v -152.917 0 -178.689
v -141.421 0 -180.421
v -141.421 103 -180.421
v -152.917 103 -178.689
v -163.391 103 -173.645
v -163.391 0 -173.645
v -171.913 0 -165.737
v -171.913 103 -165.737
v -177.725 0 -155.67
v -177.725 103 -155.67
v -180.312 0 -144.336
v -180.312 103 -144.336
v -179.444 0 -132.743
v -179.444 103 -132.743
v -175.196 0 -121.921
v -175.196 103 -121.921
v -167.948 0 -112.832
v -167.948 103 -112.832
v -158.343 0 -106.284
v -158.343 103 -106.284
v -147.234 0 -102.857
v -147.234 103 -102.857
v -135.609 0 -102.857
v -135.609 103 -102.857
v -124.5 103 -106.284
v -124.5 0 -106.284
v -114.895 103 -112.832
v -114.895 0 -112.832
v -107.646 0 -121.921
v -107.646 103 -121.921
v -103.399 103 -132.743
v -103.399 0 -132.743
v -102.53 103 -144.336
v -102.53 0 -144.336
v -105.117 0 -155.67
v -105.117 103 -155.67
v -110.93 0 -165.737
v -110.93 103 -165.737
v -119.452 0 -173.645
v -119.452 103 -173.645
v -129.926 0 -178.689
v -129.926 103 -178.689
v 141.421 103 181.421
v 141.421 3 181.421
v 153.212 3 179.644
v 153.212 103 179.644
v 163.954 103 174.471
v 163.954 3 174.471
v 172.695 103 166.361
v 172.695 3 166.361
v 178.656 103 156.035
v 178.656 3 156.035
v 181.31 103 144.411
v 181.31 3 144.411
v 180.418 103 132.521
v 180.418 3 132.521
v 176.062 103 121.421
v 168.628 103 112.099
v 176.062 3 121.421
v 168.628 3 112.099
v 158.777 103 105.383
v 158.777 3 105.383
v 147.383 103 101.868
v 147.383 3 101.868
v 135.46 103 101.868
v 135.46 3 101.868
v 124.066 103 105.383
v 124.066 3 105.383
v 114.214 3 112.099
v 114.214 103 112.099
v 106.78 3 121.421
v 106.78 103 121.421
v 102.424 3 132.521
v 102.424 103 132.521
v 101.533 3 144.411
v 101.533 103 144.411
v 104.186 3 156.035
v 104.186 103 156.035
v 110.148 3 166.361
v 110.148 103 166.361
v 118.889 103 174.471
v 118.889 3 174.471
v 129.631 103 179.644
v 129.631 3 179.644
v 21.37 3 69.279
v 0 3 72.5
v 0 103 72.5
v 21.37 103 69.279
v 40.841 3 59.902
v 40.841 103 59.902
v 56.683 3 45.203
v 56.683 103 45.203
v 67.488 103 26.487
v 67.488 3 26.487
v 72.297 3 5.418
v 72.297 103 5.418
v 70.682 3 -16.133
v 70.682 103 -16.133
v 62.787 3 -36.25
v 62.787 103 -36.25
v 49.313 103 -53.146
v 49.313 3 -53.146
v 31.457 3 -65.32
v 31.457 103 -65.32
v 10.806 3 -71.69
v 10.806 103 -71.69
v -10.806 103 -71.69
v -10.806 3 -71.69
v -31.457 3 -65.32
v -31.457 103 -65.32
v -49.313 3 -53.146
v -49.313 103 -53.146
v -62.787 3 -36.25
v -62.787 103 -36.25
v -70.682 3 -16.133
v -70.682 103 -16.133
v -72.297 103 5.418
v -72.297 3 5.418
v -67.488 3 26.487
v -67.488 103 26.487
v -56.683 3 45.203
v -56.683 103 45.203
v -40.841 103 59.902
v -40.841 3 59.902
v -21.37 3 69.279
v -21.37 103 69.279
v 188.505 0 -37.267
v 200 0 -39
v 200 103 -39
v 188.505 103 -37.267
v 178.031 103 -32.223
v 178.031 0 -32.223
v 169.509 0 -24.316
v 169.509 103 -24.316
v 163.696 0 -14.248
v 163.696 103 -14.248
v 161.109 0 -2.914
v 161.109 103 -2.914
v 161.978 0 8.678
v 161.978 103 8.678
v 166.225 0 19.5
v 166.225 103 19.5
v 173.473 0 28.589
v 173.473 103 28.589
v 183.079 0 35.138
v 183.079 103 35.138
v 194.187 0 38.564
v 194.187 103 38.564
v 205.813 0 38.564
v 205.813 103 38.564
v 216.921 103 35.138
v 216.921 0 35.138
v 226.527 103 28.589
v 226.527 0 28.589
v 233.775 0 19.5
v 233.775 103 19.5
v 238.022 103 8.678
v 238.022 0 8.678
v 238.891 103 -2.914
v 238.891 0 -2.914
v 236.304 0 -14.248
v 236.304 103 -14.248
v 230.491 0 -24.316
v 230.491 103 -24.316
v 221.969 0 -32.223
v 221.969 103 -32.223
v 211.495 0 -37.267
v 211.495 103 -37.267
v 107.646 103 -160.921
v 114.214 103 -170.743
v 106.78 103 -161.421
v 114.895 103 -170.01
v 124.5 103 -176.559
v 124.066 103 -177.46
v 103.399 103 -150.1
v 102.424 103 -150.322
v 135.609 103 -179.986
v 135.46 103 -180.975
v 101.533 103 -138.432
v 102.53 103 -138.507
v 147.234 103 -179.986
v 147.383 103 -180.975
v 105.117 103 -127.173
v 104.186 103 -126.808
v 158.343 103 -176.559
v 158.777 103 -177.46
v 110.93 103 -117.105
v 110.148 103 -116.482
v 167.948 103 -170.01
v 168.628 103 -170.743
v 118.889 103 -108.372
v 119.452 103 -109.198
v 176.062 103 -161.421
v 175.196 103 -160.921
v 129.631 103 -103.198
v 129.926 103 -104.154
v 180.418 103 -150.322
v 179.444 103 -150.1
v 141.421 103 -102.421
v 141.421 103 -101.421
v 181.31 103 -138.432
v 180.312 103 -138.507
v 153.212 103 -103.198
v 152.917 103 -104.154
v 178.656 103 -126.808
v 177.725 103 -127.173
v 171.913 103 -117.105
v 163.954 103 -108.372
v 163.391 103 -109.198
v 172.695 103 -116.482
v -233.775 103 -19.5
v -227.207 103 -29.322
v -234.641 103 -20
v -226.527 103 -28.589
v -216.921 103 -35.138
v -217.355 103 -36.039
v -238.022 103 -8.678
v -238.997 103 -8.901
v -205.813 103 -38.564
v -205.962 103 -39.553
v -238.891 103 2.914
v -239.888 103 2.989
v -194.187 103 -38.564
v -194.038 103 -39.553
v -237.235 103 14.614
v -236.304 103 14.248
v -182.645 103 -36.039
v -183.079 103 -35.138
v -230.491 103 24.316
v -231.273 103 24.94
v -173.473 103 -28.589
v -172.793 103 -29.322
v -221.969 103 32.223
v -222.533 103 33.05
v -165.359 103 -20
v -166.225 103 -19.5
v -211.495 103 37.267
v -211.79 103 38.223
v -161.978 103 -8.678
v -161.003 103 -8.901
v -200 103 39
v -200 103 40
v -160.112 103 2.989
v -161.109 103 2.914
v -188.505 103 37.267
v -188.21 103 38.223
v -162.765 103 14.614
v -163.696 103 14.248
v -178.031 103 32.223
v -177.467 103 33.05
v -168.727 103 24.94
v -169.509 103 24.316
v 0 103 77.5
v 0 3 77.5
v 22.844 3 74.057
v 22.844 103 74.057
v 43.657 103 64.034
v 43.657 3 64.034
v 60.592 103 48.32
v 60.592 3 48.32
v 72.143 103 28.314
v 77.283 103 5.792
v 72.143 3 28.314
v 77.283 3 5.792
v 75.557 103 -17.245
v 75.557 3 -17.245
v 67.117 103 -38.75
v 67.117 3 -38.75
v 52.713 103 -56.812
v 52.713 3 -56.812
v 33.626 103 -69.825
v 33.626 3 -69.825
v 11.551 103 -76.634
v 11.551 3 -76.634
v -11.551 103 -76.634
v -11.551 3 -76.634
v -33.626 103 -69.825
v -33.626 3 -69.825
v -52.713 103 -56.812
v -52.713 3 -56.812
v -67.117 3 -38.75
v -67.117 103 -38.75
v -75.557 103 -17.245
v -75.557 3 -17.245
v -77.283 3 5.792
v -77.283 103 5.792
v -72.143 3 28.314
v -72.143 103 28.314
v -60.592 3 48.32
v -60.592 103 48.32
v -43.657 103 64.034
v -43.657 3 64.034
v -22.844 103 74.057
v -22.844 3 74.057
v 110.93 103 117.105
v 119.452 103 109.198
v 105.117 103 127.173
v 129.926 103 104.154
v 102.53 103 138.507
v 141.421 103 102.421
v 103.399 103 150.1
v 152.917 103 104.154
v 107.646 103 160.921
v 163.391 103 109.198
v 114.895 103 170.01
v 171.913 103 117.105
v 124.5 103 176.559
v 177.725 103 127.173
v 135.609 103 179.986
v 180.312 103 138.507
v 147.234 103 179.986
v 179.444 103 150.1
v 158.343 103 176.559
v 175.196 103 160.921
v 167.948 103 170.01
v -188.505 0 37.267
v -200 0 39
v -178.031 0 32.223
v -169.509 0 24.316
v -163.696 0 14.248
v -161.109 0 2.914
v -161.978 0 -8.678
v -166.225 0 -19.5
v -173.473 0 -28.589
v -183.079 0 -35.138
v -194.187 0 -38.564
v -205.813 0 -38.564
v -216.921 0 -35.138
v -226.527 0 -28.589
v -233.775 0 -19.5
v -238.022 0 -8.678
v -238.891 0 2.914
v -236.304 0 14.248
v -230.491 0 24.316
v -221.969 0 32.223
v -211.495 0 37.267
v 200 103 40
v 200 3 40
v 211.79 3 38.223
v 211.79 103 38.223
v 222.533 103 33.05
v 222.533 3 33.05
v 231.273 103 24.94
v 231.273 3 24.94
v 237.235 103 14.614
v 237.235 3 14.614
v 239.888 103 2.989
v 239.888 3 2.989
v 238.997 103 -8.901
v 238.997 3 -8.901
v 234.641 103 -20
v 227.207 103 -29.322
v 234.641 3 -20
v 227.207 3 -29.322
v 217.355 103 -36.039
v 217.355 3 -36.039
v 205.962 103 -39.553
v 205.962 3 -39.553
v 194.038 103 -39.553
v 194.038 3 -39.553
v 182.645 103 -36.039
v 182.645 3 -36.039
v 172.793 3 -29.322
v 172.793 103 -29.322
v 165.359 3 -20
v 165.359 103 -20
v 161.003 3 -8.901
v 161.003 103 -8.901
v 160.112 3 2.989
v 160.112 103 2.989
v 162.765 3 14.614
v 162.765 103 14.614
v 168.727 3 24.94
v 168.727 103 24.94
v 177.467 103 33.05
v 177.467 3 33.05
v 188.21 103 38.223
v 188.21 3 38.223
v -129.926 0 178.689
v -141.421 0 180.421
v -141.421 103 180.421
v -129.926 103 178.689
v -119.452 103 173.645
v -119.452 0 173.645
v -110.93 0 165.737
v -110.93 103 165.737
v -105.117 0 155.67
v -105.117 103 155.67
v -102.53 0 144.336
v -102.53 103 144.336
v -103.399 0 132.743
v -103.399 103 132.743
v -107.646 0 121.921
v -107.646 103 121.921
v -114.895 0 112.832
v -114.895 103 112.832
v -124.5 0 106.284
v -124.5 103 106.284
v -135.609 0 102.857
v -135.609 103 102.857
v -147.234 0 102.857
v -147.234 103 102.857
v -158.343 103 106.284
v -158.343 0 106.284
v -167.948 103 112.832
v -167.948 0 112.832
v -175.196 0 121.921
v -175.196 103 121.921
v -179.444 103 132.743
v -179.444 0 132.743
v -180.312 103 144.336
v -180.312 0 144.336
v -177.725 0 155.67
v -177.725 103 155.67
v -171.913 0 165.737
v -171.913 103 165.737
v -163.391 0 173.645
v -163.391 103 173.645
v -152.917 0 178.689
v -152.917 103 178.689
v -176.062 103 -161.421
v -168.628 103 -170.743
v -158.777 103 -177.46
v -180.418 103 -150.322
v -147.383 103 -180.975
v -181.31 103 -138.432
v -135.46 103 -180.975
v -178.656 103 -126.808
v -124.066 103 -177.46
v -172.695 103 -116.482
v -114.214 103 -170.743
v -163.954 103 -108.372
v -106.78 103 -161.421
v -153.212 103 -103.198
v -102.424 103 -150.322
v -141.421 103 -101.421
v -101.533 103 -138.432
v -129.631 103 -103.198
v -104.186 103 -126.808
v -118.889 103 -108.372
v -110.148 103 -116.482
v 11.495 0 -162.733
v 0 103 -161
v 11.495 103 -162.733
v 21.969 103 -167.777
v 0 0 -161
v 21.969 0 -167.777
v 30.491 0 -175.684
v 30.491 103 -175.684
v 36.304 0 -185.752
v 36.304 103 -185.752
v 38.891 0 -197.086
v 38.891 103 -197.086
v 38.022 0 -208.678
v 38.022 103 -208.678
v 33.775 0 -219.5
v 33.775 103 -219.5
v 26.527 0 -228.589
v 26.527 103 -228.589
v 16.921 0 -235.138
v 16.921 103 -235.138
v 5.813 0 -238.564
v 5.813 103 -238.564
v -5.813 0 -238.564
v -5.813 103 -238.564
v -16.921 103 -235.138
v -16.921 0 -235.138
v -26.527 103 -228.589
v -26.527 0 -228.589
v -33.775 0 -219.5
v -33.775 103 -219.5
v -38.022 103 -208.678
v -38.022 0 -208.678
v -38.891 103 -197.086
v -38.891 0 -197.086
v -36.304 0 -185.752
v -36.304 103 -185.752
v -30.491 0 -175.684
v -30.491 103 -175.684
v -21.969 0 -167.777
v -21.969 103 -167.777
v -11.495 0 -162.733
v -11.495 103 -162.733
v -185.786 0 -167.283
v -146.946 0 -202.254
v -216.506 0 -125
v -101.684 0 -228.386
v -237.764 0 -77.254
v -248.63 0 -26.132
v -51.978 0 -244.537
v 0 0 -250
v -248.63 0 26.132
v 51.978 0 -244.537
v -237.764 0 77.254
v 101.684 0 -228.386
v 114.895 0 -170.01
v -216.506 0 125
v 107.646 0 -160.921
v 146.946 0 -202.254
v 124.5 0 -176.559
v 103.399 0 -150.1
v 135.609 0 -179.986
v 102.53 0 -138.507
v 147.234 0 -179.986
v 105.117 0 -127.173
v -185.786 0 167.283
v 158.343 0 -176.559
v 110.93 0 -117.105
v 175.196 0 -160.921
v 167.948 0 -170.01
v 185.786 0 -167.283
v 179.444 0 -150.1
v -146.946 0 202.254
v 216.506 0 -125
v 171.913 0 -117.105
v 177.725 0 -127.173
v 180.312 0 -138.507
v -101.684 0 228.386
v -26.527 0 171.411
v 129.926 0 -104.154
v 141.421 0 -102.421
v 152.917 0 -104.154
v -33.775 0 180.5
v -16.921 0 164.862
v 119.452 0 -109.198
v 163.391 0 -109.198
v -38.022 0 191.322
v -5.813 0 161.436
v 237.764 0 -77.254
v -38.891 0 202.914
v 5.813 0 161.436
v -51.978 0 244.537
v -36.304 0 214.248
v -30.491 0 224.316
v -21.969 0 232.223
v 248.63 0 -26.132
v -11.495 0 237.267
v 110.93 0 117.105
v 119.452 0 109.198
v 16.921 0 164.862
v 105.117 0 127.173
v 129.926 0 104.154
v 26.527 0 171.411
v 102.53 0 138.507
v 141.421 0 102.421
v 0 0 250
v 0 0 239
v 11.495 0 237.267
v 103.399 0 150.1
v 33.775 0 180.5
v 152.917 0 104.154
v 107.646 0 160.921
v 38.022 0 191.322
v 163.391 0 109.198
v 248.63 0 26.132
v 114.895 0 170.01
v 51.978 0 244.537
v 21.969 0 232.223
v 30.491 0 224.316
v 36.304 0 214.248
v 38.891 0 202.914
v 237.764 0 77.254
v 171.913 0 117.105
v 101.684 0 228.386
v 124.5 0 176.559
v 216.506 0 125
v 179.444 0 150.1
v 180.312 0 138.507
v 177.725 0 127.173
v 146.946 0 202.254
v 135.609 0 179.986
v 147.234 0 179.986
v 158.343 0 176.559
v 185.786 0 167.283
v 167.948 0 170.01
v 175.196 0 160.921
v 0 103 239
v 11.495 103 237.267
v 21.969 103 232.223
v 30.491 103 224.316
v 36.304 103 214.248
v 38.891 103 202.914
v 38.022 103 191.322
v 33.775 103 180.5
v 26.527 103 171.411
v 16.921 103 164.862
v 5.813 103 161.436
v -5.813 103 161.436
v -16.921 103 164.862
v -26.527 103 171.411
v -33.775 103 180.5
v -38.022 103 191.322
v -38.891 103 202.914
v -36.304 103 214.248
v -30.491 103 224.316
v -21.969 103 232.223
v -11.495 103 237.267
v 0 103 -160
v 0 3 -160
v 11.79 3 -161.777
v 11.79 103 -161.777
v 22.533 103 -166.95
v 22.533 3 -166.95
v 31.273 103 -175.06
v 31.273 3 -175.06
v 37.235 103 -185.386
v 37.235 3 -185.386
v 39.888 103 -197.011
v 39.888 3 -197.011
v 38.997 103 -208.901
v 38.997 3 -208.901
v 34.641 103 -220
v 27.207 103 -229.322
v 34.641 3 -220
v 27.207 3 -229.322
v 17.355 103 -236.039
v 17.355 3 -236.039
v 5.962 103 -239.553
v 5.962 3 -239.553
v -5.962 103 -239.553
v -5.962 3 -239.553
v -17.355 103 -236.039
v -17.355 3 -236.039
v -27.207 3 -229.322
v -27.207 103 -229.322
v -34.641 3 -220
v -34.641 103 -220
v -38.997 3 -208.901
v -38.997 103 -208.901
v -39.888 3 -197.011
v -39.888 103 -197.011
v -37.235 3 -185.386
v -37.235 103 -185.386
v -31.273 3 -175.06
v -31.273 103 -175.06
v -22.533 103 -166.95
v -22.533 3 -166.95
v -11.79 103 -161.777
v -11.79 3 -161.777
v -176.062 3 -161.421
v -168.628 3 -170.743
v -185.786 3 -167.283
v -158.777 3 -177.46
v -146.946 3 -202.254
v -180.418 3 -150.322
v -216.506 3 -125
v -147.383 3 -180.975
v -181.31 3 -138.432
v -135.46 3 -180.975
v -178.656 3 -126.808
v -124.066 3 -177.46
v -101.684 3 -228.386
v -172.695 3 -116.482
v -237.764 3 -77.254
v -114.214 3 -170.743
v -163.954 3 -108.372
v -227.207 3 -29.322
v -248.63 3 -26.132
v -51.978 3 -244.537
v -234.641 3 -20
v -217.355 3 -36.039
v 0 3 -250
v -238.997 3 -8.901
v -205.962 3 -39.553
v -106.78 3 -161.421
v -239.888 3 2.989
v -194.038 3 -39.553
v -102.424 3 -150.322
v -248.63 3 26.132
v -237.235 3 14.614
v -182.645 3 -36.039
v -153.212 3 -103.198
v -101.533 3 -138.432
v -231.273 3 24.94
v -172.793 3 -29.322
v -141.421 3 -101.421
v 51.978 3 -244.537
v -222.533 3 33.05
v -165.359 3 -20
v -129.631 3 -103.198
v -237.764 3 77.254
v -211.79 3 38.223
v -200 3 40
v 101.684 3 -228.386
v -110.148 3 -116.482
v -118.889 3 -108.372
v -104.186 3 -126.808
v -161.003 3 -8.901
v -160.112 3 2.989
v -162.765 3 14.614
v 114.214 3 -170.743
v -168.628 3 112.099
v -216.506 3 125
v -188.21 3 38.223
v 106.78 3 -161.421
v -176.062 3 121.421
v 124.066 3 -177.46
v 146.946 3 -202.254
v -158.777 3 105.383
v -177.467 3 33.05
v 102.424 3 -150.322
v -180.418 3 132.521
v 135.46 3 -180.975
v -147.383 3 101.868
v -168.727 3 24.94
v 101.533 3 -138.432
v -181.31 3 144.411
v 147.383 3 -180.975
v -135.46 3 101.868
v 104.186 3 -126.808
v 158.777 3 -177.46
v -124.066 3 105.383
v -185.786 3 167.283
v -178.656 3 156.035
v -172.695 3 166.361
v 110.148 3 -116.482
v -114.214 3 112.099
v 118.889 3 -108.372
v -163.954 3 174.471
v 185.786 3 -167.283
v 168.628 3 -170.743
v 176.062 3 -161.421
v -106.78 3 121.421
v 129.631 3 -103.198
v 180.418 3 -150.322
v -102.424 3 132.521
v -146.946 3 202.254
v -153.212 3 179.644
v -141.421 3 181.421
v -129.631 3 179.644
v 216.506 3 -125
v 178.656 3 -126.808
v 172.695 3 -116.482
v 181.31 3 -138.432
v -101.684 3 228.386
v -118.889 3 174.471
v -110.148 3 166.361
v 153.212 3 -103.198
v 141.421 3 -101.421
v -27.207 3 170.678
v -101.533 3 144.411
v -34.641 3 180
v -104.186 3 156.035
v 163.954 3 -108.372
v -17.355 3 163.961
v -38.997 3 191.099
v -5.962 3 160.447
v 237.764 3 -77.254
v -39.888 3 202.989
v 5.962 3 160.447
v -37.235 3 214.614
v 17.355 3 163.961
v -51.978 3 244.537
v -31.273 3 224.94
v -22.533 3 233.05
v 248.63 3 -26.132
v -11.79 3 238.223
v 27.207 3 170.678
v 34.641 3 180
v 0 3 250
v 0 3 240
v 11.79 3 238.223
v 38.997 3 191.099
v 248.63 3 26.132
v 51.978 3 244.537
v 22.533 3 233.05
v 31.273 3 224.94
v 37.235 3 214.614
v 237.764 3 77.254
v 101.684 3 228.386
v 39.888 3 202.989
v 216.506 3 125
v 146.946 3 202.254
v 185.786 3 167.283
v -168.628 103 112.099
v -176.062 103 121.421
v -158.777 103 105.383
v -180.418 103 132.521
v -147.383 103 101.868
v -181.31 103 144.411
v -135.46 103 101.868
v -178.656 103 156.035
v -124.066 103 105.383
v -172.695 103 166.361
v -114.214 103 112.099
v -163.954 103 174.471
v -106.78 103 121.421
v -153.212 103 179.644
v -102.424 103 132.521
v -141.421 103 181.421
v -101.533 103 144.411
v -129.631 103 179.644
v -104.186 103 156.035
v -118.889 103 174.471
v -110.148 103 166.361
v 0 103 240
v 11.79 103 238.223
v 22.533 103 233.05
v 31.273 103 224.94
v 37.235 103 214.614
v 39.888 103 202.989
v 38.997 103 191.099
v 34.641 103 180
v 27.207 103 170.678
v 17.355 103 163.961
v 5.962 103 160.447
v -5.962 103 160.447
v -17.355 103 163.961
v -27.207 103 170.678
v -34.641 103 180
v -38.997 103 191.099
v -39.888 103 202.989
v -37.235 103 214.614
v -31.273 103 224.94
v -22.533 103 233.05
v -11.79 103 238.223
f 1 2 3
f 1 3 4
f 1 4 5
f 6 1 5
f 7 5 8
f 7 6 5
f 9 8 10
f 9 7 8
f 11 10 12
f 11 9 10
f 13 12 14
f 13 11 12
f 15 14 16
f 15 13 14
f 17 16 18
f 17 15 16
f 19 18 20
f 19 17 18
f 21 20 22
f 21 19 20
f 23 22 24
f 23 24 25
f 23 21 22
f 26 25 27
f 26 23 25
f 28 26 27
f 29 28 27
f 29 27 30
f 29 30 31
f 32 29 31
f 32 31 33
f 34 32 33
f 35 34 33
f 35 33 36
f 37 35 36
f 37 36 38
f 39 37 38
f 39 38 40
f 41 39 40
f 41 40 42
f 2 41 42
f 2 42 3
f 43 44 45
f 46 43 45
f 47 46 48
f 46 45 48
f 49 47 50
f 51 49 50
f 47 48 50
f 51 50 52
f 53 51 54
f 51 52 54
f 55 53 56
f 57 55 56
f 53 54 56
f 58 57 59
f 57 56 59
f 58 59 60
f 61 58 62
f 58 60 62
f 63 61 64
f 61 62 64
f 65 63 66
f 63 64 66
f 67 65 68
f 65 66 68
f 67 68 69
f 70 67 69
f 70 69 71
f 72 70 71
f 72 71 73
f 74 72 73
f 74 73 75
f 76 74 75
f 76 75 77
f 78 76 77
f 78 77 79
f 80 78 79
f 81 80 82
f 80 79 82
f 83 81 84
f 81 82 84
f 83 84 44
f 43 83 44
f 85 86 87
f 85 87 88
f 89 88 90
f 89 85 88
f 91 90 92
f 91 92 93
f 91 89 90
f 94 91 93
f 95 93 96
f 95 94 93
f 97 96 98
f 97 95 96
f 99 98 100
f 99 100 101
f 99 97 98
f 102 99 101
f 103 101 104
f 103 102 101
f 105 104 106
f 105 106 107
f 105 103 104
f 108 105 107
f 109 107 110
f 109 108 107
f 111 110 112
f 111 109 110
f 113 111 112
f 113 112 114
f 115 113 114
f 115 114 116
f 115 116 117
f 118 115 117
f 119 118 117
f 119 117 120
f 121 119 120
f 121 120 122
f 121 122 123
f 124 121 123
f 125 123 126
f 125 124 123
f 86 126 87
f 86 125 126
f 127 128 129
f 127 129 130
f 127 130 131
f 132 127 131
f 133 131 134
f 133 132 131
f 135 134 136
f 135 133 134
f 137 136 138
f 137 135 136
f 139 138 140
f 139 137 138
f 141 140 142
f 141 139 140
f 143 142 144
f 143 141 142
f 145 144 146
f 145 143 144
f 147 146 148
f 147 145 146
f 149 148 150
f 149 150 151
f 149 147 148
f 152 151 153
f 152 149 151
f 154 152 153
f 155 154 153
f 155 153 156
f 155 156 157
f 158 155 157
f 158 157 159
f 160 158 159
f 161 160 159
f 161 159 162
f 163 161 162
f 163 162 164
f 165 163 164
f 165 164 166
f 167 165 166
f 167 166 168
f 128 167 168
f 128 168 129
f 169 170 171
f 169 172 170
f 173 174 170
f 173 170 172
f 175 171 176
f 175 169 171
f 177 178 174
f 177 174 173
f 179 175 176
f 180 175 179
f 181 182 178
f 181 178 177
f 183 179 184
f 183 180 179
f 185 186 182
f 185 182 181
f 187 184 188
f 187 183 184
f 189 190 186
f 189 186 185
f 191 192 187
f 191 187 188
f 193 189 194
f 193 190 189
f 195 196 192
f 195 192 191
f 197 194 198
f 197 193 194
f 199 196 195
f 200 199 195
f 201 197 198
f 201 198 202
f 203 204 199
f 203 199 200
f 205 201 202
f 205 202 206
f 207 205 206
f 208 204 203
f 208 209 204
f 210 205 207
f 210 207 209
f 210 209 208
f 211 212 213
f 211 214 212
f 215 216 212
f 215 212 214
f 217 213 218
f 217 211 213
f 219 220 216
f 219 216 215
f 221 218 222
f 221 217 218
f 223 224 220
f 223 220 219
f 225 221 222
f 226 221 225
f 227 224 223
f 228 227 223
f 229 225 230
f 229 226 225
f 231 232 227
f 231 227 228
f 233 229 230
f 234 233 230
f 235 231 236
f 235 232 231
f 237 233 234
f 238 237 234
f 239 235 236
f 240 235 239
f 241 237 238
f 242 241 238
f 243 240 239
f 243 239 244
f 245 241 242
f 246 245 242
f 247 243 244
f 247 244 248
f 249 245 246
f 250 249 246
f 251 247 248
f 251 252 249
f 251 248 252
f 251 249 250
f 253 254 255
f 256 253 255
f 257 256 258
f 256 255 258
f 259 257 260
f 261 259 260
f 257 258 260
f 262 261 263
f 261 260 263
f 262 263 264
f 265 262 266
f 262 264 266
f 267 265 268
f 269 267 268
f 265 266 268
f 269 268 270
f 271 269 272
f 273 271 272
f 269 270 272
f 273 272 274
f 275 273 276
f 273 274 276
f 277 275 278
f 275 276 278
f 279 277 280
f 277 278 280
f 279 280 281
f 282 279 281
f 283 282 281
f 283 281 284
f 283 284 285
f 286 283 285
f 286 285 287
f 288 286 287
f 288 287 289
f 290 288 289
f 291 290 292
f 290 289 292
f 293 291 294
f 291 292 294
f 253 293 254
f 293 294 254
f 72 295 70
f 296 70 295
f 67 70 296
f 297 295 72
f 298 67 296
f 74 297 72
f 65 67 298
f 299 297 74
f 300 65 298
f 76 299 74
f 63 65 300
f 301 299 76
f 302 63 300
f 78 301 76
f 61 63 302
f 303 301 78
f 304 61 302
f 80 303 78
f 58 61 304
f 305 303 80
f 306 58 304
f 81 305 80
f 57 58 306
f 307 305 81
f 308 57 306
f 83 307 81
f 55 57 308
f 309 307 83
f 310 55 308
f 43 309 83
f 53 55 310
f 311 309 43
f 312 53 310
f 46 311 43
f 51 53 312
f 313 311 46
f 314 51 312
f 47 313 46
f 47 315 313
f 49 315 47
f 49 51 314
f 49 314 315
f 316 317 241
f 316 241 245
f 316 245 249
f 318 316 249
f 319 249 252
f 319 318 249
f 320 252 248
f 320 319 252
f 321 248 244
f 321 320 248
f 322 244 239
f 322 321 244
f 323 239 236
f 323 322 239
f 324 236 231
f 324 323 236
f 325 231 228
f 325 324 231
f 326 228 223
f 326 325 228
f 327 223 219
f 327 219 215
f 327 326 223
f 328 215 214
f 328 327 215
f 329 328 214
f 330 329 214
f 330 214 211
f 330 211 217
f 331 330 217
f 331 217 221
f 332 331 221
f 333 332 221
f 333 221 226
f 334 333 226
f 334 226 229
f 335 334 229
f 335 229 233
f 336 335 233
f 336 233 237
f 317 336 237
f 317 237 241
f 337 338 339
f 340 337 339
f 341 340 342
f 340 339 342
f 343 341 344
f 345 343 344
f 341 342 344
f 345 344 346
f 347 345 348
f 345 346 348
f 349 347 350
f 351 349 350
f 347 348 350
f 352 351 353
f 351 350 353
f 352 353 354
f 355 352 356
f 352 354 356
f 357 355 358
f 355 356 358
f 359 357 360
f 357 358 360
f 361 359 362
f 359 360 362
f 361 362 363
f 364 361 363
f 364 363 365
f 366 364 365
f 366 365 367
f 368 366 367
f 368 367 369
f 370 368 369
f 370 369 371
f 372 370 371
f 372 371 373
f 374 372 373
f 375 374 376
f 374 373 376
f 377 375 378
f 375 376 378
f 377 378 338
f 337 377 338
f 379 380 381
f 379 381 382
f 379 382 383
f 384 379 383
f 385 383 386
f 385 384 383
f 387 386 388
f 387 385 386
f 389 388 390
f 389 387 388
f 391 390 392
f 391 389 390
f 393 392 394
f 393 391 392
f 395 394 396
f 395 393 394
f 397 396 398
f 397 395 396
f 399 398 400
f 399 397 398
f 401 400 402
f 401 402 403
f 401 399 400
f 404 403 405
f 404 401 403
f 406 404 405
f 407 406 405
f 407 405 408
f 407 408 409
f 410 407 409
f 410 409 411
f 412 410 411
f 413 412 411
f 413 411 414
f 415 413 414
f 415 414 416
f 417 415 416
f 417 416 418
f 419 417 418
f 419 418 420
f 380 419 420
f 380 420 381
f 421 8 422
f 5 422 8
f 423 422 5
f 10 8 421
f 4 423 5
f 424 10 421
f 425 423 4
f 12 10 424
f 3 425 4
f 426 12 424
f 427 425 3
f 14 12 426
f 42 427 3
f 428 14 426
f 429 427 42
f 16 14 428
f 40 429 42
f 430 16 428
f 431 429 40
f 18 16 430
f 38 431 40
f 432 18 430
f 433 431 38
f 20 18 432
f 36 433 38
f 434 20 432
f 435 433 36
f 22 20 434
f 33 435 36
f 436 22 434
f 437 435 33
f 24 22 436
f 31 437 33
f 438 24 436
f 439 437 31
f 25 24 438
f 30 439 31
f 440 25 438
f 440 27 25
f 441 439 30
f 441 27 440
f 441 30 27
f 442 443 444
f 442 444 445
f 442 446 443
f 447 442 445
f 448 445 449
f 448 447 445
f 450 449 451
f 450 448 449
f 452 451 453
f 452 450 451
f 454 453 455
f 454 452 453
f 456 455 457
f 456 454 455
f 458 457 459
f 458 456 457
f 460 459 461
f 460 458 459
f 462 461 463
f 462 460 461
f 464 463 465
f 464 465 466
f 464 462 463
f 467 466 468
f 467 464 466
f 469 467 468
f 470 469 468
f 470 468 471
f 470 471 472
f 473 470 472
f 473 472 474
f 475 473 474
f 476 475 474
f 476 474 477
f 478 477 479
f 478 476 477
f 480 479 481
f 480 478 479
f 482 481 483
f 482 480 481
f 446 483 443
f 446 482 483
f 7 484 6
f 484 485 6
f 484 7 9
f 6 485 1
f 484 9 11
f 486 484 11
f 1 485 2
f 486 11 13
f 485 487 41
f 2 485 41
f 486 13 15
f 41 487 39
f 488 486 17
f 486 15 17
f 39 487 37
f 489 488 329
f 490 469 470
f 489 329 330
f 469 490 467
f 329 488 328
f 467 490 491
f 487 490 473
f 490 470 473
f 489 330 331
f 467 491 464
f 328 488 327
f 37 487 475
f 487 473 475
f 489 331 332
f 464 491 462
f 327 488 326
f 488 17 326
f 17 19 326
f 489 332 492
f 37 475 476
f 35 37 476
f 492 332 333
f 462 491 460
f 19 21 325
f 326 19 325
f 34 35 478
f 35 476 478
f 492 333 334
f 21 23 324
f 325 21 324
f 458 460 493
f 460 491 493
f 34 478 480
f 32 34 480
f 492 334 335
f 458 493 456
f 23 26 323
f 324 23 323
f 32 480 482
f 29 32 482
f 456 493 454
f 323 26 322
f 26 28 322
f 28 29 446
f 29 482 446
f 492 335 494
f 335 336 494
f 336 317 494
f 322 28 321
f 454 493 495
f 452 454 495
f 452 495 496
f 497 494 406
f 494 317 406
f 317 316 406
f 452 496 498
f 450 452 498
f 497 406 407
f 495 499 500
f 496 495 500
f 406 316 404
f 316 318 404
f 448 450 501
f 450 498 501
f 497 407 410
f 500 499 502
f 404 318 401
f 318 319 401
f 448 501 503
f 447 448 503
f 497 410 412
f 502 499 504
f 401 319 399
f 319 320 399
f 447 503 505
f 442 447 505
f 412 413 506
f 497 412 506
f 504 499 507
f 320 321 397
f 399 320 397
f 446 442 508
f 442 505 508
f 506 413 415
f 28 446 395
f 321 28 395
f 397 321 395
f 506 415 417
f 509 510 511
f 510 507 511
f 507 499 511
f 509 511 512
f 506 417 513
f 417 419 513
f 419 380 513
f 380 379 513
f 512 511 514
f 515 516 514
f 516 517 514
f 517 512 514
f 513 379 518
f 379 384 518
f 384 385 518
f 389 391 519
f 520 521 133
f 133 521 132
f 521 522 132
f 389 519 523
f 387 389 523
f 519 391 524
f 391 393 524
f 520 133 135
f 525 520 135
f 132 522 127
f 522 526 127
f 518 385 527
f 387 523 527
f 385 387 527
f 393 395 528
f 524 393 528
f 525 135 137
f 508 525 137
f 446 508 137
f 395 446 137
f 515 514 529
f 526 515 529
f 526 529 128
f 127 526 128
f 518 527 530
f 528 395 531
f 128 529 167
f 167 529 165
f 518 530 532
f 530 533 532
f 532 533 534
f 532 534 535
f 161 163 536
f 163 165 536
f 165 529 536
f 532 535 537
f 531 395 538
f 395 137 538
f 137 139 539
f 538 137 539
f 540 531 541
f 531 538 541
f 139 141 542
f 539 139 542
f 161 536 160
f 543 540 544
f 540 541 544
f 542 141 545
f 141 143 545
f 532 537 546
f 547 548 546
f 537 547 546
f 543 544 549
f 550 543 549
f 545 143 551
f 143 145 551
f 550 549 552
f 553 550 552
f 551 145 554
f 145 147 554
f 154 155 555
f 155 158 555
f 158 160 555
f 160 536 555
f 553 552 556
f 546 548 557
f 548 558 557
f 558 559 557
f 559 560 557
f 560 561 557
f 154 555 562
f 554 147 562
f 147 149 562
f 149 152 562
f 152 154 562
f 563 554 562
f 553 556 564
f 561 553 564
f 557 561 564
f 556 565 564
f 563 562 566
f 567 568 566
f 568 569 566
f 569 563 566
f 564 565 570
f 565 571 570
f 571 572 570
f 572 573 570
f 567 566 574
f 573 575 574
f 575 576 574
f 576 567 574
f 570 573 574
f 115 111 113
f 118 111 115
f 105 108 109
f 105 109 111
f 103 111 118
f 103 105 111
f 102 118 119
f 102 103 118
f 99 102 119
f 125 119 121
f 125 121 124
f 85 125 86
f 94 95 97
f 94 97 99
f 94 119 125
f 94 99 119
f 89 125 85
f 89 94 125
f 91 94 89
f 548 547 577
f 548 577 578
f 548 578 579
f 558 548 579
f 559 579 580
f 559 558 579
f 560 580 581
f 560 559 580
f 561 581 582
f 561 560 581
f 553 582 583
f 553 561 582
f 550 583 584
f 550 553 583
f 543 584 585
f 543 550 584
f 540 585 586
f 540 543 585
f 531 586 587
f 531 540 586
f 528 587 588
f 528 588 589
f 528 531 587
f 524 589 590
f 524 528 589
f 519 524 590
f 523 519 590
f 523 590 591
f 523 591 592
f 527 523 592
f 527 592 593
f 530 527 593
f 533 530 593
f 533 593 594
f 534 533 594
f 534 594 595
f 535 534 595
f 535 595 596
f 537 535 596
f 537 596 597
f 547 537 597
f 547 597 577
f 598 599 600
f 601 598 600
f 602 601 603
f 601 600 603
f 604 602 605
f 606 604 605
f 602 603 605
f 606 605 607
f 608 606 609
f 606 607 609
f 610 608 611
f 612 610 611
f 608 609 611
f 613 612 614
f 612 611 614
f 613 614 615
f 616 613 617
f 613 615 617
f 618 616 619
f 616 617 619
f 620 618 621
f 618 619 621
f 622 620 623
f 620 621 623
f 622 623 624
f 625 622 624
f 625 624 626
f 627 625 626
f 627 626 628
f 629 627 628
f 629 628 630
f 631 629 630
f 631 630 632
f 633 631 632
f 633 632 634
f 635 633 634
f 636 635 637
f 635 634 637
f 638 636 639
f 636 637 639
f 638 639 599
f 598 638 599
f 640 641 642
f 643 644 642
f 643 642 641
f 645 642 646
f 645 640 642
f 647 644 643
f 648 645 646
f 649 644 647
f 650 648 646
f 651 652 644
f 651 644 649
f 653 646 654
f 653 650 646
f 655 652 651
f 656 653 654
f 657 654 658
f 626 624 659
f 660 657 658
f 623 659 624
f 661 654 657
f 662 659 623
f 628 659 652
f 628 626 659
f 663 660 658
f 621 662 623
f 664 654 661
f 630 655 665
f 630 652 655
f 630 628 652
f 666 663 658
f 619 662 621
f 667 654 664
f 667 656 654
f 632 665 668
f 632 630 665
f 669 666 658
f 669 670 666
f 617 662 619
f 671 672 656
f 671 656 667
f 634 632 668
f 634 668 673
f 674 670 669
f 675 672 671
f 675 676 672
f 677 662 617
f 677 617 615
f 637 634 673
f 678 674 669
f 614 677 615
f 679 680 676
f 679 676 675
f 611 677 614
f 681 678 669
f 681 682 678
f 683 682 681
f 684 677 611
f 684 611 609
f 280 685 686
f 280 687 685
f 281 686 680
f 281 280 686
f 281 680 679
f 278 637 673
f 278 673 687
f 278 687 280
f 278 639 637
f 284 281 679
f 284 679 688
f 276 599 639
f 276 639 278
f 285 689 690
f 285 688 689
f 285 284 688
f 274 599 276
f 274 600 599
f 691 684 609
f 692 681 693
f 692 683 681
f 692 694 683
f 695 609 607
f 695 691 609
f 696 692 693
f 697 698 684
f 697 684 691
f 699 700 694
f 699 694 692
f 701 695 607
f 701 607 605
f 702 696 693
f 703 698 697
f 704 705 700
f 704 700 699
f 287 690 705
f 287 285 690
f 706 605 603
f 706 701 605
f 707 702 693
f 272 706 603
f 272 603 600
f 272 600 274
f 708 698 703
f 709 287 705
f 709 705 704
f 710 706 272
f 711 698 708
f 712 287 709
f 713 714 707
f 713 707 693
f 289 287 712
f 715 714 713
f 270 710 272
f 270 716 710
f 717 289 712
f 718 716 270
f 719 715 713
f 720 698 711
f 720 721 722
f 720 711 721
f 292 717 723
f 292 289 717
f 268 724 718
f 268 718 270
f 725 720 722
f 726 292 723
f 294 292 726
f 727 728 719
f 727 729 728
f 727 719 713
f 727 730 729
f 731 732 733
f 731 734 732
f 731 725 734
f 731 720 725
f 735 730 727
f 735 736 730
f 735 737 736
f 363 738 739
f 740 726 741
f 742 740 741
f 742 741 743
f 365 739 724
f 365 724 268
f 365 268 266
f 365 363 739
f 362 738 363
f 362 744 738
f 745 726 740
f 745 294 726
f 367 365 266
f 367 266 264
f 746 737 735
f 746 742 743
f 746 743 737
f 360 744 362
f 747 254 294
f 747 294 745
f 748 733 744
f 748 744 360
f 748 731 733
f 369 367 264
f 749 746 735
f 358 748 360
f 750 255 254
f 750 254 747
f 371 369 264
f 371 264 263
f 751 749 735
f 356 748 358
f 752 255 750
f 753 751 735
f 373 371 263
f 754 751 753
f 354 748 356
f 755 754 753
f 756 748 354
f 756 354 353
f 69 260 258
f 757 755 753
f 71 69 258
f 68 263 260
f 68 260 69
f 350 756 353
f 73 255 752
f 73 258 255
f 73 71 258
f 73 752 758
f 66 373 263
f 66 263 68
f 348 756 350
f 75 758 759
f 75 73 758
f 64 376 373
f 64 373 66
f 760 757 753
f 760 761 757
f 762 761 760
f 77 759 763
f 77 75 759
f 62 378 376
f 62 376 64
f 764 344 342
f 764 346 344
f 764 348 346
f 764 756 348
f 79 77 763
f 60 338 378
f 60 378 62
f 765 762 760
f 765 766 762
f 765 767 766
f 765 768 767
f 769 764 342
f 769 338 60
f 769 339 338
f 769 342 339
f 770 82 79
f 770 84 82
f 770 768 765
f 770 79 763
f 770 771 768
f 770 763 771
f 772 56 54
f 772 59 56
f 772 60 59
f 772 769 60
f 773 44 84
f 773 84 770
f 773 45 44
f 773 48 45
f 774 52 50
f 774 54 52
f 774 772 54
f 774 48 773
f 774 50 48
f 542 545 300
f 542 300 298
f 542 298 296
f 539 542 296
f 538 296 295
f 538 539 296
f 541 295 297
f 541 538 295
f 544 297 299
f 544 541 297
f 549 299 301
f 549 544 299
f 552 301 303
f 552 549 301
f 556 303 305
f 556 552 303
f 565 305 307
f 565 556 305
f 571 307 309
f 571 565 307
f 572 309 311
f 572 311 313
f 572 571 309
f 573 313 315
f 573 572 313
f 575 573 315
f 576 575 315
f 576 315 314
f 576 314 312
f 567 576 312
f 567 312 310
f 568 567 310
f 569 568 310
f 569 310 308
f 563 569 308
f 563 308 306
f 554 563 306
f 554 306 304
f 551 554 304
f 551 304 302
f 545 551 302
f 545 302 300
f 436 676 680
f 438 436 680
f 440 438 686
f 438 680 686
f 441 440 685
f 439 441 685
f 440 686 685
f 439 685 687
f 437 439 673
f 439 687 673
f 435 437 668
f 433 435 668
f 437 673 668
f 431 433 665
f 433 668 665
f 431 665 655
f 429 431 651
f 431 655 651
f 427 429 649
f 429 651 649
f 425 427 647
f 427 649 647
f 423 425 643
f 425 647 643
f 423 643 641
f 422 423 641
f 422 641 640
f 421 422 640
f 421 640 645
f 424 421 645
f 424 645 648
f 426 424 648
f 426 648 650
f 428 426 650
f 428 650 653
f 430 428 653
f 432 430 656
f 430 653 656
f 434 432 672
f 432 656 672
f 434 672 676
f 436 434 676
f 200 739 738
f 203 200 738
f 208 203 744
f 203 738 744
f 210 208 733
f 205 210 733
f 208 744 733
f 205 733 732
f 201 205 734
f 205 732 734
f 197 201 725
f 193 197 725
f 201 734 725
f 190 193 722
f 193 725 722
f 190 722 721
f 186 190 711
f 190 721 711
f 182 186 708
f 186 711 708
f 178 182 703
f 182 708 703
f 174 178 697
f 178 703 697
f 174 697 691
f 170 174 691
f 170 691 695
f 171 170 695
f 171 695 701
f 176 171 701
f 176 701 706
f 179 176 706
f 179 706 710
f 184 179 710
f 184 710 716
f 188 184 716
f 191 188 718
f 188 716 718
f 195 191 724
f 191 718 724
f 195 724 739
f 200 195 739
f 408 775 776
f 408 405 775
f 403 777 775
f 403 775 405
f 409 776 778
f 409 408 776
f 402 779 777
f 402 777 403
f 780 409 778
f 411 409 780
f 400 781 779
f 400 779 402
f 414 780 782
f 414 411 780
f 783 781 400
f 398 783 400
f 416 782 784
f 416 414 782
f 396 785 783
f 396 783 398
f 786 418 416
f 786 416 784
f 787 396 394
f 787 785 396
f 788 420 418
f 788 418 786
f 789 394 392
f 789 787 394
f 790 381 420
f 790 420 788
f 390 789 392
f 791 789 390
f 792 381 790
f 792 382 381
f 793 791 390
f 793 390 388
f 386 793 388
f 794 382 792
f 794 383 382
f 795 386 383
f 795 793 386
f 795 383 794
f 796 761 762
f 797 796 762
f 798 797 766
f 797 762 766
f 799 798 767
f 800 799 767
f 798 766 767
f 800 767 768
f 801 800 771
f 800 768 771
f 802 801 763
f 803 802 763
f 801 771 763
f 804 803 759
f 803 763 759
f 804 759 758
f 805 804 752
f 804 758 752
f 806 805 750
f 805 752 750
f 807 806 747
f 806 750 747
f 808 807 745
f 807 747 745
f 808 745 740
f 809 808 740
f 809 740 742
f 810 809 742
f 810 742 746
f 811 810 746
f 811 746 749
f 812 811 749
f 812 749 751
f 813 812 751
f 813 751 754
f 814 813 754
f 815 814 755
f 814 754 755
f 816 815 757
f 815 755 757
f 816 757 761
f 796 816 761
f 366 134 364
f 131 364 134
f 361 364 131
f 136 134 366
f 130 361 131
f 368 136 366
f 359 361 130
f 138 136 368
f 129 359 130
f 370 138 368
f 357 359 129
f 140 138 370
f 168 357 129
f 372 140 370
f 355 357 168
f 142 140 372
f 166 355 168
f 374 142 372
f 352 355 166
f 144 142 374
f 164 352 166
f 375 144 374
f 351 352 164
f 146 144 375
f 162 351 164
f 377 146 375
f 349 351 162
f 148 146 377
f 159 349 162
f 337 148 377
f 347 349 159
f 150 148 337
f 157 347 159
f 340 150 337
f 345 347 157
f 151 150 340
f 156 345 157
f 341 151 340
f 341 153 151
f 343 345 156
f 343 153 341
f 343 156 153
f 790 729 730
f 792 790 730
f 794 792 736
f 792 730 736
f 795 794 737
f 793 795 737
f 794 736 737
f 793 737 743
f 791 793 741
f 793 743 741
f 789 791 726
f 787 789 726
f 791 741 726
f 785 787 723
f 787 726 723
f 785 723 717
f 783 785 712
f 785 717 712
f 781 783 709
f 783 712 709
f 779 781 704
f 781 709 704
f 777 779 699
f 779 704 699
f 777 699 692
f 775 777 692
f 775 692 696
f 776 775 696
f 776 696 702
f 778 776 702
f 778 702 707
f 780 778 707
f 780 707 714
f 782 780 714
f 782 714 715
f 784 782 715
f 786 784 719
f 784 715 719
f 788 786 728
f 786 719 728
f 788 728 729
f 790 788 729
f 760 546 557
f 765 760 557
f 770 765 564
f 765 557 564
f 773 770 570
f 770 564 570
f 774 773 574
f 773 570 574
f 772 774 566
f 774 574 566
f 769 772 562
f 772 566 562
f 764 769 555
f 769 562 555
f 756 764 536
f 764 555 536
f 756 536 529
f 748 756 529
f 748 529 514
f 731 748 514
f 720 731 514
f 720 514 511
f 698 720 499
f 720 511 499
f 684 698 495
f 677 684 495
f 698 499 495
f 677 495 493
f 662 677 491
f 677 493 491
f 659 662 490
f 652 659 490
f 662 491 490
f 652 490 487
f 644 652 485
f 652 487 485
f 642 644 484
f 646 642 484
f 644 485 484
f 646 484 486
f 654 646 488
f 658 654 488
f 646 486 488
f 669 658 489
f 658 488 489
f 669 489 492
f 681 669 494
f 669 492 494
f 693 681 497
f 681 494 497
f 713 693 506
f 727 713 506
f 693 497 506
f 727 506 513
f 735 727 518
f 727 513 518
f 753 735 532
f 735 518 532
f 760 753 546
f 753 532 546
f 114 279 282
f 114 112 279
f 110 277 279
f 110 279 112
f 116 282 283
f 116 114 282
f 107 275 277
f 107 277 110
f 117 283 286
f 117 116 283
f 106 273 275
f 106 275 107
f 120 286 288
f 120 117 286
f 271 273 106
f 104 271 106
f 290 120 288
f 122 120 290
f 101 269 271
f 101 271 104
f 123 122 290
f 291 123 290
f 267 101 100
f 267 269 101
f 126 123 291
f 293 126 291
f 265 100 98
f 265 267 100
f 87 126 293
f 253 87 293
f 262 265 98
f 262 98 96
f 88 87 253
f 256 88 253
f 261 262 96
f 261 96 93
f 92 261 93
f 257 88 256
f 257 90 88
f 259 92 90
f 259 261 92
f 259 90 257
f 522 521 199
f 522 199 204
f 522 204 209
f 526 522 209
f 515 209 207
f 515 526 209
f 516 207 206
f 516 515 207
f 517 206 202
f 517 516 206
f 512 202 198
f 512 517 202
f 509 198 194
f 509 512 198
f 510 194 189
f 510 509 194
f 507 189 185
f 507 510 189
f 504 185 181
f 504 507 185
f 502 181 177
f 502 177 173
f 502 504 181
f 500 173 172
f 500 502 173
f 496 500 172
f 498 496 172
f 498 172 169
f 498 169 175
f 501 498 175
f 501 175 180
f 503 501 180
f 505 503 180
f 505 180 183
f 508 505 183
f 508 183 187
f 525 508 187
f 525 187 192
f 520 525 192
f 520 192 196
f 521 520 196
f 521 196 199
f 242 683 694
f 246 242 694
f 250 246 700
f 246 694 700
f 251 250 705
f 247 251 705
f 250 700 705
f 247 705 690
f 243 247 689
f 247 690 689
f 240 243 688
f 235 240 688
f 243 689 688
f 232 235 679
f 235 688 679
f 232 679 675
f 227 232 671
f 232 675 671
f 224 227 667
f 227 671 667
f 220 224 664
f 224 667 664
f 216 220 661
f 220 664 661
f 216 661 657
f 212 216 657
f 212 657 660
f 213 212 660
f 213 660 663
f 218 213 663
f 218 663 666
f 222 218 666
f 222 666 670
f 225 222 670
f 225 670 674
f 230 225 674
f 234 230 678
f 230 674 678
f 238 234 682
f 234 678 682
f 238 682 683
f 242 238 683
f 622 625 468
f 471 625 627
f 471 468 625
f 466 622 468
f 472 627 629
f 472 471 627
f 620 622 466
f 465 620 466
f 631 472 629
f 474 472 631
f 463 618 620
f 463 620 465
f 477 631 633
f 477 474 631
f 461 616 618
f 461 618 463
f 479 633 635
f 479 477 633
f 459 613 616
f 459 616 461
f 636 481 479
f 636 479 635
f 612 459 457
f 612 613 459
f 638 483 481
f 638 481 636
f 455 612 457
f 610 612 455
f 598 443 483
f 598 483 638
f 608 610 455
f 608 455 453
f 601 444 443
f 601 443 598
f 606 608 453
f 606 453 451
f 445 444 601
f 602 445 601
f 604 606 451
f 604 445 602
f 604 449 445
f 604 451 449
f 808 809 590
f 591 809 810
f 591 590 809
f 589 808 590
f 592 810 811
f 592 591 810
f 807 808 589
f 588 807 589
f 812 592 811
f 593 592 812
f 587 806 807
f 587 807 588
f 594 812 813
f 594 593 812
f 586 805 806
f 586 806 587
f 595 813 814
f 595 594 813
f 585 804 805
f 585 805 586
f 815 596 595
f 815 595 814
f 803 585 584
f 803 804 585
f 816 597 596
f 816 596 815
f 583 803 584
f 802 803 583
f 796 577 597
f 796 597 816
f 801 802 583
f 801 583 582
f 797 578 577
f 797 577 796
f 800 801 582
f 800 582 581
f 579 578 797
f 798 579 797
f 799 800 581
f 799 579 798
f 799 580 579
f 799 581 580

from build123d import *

# Parameters (mm, degrees)
SKETCH1_R           = 250
SKETCH1_R_2         = 39
BOSS_EXTRUDE1_DEPTH = 3
SKETCH2_R           = 40
SKETCH2_R_2         = 39
BOSS_EXTRUDE2_DEPTH = 100
SKETCH3_R           = 77.5
SKETCH3_R_2         = 72.5
BOSS_EXTRUDE3_DEPTH = 100


with BuildPart() as part:
    # Sketch1 → Boss-Extrude1 (new body)
    with BuildSketch(Plane(origin=(0, 0, 0), x_dir=(1, 0, 0), z_dir=(0, 1, 0))):
        with Locations(Location((0, 0, 0), (0, 0, 270))):
            Circle(SKETCH1_R)
        with Locations(Location((141.421356237, 141.421356237, 0), (0, 0, 270))):
            Circle(SKETCH1_R_2, mode=Mode.SUBTRACT)
        with Locations(Location((-141.421356237, 141.421356237, 0), (0, 0, 90))):
            Circle(SKETCH1_R_2, mode=Mode.SUBTRACT)
        with Locations(Location((-141.421356237, -141.421356237, 0), (0, 0, 270))):
            Circle(SKETCH1_R_2, mode=Mode.SUBTRACT)
        with Locations(Location((141.421356237, -141.421356237, 0), (0, 0, 90))):
            Circle(SKETCH1_R_2, mode=Mode.SUBTRACT)
        with Locations(Location((0, 200, 0), (0, 0, 270))):
            Circle(SKETCH1_R_2, mode=Mode.SUBTRACT)
        with Locations(Location((200, 0, 0), (0, 0, 90))):
            Circle(SKETCH1_R_2, mode=Mode.SUBTRACT)
        with Locations(Location((0, -200, 0), (0, 0, 270))):
            Circle(SKETCH1_R_2, mode=Mode.SUBTRACT)
        with Locations(Location((-200, 0, 0), (0, 0, 270))):
            Circle(SKETCH1_R_2, mode=Mode.SUBTRACT)
    extrude(amount=BOSS_EXTRUDE1_DEPTH)

    # Sketch2 → Boss-Extrude2 (add)
    # profile 1 of 8: a face of its own
    with BuildSketch(Plane(origin=(0, 3, 0), x_dir=(1, 0, 0), z_dir=(0, 1, 0))):
        with Locations(Location((0, 200, 0), (0, 0, 270))):
            Circle(SKETCH2_R)
        with Locations(Location((0, 200, 0), (0, 0, 270))):
            Circle(SKETCH2_R_2, mode=Mode.SUBTRACT)
    # profile 2 of 8: a face of its own
    with BuildSketch(Plane(origin=(0, 3, 0), x_dir=(1, 0, 0), z_dir=(0, 1, 0))):
        with Locations(Location((141.421356237, 141.421356237, 0), (0, 0, 270))):
            Circle(SKETCH2_R)
        with Locations(Location((141.421356237, 141.421356237, 0), (0, 0, 270))):
            Circle(SKETCH2_R_2, mode=Mode.SUBTRACT)
    # profile 3 of 8: a face of its own
    with BuildSketch(Plane(origin=(0, 3, 0), x_dir=(1, 0, 0), z_dir=(0, 1, 0))):
        with Locations(Location((200, 0, 0), (0, 0, 270))):
            Circle(SKETCH2_R)
        with Locations(Location((200, 0, 0), (0, 0, 90))):
            Circle(SKETCH2_R_2, mode=Mode.SUBTRACT)
    # profile 4 of 8: a face of its own
    with BuildSketch(Plane(origin=(0, 3, 0), x_dir=(1, 0, 0), z_dir=(0, 1, 0))):
        with Locations(Location((141.421356237, -141.421356237, 0), (0, 0, 270))):
            Circle(SKETCH2_R)
        with Locations(Location((141.421356237, -141.421356237, 0), (0, 0, 90))):
            Circle(SKETCH2_R_2, mode=Mode.SUBTRACT)
    # profile 5 of 8: a face of its own
    with BuildSketch(Plane(origin=(0, 3, 0), x_dir=(1, 0, 0), z_dir=(0, 1, 0))):
        with Locations(Location((0, -200, 0), (0, 0, 270))):
            Circle(SKETCH2_R)
        with Locations(Location((0, -200, 0), (0, 0, 270))):
            Circle(SKETCH2_R_2, mode=Mode.SUBTRACT)
    # profile 6 of 8: a face of its own
    with BuildSketch(Plane(origin=(0, 3, 0), x_dir=(1, 0, 0), z_dir=(0, 1, 0))):
        with Locations(Location((-141.421356237, -141.421356237, 0), (0, 0, 270))):
            Circle(SKETCH2_R)
        with Locations(Location((-141.421356237, -141.421356237, 0), (0, 0, 270))):
            Circle(SKETCH2_R_2, mode=Mode.SUBTRACT)
    # profile 7 of 8: a face of its own
    with BuildSketch(Plane(origin=(0, 3, 0), x_dir=(1, 0, 0), z_dir=(0, 1, 0))):
        with Locations(Location((-200, 0, 0), (0, 0, 270))):
            Circle(SKETCH2_R)
        with Locations(Location((-200, 0, 0), (0, 0, 270))):
            Circle(SKETCH2_R_2, mode=Mode.SUBTRACT)
    # profile 8 of 8: a face of its own
    with BuildSketch(Plane(origin=(0, 3, 0), x_dir=(1, 0, 0), z_dir=(0, 1, 0))):
        with Locations(Location((-141.421356237, 141.421356237, 0), (0, 0, 270))):
            Circle(SKETCH2_R)
        with Locations(Location((-141.421356237, 141.421356237, 0), (0, 0, 90))):
            Circle(SKETCH2_R_2, mode=Mode.SUBTRACT)
    extrude(amount=BOSS_EXTRUDE2_DEPTH)

    # Sketch3 → Boss-Extrude3 (add)
    with BuildSketch(Plane(origin=(0, 3, 0), x_dir=(1, 0, 0), z_dir=(0, 1, 0))):
        with Locations(Location((0, 0, 0), (0, 0, 270))):
            Circle(SKETCH3_R)
        with Locations(Location((0, 0, 0), (0, 0, 270))):
            Circle(SKETCH3_R_2, mode=Mode.SUBTRACT)
    extrude(amount=BOSS_EXTRUDE3_DEPTH)


solid = part.part
